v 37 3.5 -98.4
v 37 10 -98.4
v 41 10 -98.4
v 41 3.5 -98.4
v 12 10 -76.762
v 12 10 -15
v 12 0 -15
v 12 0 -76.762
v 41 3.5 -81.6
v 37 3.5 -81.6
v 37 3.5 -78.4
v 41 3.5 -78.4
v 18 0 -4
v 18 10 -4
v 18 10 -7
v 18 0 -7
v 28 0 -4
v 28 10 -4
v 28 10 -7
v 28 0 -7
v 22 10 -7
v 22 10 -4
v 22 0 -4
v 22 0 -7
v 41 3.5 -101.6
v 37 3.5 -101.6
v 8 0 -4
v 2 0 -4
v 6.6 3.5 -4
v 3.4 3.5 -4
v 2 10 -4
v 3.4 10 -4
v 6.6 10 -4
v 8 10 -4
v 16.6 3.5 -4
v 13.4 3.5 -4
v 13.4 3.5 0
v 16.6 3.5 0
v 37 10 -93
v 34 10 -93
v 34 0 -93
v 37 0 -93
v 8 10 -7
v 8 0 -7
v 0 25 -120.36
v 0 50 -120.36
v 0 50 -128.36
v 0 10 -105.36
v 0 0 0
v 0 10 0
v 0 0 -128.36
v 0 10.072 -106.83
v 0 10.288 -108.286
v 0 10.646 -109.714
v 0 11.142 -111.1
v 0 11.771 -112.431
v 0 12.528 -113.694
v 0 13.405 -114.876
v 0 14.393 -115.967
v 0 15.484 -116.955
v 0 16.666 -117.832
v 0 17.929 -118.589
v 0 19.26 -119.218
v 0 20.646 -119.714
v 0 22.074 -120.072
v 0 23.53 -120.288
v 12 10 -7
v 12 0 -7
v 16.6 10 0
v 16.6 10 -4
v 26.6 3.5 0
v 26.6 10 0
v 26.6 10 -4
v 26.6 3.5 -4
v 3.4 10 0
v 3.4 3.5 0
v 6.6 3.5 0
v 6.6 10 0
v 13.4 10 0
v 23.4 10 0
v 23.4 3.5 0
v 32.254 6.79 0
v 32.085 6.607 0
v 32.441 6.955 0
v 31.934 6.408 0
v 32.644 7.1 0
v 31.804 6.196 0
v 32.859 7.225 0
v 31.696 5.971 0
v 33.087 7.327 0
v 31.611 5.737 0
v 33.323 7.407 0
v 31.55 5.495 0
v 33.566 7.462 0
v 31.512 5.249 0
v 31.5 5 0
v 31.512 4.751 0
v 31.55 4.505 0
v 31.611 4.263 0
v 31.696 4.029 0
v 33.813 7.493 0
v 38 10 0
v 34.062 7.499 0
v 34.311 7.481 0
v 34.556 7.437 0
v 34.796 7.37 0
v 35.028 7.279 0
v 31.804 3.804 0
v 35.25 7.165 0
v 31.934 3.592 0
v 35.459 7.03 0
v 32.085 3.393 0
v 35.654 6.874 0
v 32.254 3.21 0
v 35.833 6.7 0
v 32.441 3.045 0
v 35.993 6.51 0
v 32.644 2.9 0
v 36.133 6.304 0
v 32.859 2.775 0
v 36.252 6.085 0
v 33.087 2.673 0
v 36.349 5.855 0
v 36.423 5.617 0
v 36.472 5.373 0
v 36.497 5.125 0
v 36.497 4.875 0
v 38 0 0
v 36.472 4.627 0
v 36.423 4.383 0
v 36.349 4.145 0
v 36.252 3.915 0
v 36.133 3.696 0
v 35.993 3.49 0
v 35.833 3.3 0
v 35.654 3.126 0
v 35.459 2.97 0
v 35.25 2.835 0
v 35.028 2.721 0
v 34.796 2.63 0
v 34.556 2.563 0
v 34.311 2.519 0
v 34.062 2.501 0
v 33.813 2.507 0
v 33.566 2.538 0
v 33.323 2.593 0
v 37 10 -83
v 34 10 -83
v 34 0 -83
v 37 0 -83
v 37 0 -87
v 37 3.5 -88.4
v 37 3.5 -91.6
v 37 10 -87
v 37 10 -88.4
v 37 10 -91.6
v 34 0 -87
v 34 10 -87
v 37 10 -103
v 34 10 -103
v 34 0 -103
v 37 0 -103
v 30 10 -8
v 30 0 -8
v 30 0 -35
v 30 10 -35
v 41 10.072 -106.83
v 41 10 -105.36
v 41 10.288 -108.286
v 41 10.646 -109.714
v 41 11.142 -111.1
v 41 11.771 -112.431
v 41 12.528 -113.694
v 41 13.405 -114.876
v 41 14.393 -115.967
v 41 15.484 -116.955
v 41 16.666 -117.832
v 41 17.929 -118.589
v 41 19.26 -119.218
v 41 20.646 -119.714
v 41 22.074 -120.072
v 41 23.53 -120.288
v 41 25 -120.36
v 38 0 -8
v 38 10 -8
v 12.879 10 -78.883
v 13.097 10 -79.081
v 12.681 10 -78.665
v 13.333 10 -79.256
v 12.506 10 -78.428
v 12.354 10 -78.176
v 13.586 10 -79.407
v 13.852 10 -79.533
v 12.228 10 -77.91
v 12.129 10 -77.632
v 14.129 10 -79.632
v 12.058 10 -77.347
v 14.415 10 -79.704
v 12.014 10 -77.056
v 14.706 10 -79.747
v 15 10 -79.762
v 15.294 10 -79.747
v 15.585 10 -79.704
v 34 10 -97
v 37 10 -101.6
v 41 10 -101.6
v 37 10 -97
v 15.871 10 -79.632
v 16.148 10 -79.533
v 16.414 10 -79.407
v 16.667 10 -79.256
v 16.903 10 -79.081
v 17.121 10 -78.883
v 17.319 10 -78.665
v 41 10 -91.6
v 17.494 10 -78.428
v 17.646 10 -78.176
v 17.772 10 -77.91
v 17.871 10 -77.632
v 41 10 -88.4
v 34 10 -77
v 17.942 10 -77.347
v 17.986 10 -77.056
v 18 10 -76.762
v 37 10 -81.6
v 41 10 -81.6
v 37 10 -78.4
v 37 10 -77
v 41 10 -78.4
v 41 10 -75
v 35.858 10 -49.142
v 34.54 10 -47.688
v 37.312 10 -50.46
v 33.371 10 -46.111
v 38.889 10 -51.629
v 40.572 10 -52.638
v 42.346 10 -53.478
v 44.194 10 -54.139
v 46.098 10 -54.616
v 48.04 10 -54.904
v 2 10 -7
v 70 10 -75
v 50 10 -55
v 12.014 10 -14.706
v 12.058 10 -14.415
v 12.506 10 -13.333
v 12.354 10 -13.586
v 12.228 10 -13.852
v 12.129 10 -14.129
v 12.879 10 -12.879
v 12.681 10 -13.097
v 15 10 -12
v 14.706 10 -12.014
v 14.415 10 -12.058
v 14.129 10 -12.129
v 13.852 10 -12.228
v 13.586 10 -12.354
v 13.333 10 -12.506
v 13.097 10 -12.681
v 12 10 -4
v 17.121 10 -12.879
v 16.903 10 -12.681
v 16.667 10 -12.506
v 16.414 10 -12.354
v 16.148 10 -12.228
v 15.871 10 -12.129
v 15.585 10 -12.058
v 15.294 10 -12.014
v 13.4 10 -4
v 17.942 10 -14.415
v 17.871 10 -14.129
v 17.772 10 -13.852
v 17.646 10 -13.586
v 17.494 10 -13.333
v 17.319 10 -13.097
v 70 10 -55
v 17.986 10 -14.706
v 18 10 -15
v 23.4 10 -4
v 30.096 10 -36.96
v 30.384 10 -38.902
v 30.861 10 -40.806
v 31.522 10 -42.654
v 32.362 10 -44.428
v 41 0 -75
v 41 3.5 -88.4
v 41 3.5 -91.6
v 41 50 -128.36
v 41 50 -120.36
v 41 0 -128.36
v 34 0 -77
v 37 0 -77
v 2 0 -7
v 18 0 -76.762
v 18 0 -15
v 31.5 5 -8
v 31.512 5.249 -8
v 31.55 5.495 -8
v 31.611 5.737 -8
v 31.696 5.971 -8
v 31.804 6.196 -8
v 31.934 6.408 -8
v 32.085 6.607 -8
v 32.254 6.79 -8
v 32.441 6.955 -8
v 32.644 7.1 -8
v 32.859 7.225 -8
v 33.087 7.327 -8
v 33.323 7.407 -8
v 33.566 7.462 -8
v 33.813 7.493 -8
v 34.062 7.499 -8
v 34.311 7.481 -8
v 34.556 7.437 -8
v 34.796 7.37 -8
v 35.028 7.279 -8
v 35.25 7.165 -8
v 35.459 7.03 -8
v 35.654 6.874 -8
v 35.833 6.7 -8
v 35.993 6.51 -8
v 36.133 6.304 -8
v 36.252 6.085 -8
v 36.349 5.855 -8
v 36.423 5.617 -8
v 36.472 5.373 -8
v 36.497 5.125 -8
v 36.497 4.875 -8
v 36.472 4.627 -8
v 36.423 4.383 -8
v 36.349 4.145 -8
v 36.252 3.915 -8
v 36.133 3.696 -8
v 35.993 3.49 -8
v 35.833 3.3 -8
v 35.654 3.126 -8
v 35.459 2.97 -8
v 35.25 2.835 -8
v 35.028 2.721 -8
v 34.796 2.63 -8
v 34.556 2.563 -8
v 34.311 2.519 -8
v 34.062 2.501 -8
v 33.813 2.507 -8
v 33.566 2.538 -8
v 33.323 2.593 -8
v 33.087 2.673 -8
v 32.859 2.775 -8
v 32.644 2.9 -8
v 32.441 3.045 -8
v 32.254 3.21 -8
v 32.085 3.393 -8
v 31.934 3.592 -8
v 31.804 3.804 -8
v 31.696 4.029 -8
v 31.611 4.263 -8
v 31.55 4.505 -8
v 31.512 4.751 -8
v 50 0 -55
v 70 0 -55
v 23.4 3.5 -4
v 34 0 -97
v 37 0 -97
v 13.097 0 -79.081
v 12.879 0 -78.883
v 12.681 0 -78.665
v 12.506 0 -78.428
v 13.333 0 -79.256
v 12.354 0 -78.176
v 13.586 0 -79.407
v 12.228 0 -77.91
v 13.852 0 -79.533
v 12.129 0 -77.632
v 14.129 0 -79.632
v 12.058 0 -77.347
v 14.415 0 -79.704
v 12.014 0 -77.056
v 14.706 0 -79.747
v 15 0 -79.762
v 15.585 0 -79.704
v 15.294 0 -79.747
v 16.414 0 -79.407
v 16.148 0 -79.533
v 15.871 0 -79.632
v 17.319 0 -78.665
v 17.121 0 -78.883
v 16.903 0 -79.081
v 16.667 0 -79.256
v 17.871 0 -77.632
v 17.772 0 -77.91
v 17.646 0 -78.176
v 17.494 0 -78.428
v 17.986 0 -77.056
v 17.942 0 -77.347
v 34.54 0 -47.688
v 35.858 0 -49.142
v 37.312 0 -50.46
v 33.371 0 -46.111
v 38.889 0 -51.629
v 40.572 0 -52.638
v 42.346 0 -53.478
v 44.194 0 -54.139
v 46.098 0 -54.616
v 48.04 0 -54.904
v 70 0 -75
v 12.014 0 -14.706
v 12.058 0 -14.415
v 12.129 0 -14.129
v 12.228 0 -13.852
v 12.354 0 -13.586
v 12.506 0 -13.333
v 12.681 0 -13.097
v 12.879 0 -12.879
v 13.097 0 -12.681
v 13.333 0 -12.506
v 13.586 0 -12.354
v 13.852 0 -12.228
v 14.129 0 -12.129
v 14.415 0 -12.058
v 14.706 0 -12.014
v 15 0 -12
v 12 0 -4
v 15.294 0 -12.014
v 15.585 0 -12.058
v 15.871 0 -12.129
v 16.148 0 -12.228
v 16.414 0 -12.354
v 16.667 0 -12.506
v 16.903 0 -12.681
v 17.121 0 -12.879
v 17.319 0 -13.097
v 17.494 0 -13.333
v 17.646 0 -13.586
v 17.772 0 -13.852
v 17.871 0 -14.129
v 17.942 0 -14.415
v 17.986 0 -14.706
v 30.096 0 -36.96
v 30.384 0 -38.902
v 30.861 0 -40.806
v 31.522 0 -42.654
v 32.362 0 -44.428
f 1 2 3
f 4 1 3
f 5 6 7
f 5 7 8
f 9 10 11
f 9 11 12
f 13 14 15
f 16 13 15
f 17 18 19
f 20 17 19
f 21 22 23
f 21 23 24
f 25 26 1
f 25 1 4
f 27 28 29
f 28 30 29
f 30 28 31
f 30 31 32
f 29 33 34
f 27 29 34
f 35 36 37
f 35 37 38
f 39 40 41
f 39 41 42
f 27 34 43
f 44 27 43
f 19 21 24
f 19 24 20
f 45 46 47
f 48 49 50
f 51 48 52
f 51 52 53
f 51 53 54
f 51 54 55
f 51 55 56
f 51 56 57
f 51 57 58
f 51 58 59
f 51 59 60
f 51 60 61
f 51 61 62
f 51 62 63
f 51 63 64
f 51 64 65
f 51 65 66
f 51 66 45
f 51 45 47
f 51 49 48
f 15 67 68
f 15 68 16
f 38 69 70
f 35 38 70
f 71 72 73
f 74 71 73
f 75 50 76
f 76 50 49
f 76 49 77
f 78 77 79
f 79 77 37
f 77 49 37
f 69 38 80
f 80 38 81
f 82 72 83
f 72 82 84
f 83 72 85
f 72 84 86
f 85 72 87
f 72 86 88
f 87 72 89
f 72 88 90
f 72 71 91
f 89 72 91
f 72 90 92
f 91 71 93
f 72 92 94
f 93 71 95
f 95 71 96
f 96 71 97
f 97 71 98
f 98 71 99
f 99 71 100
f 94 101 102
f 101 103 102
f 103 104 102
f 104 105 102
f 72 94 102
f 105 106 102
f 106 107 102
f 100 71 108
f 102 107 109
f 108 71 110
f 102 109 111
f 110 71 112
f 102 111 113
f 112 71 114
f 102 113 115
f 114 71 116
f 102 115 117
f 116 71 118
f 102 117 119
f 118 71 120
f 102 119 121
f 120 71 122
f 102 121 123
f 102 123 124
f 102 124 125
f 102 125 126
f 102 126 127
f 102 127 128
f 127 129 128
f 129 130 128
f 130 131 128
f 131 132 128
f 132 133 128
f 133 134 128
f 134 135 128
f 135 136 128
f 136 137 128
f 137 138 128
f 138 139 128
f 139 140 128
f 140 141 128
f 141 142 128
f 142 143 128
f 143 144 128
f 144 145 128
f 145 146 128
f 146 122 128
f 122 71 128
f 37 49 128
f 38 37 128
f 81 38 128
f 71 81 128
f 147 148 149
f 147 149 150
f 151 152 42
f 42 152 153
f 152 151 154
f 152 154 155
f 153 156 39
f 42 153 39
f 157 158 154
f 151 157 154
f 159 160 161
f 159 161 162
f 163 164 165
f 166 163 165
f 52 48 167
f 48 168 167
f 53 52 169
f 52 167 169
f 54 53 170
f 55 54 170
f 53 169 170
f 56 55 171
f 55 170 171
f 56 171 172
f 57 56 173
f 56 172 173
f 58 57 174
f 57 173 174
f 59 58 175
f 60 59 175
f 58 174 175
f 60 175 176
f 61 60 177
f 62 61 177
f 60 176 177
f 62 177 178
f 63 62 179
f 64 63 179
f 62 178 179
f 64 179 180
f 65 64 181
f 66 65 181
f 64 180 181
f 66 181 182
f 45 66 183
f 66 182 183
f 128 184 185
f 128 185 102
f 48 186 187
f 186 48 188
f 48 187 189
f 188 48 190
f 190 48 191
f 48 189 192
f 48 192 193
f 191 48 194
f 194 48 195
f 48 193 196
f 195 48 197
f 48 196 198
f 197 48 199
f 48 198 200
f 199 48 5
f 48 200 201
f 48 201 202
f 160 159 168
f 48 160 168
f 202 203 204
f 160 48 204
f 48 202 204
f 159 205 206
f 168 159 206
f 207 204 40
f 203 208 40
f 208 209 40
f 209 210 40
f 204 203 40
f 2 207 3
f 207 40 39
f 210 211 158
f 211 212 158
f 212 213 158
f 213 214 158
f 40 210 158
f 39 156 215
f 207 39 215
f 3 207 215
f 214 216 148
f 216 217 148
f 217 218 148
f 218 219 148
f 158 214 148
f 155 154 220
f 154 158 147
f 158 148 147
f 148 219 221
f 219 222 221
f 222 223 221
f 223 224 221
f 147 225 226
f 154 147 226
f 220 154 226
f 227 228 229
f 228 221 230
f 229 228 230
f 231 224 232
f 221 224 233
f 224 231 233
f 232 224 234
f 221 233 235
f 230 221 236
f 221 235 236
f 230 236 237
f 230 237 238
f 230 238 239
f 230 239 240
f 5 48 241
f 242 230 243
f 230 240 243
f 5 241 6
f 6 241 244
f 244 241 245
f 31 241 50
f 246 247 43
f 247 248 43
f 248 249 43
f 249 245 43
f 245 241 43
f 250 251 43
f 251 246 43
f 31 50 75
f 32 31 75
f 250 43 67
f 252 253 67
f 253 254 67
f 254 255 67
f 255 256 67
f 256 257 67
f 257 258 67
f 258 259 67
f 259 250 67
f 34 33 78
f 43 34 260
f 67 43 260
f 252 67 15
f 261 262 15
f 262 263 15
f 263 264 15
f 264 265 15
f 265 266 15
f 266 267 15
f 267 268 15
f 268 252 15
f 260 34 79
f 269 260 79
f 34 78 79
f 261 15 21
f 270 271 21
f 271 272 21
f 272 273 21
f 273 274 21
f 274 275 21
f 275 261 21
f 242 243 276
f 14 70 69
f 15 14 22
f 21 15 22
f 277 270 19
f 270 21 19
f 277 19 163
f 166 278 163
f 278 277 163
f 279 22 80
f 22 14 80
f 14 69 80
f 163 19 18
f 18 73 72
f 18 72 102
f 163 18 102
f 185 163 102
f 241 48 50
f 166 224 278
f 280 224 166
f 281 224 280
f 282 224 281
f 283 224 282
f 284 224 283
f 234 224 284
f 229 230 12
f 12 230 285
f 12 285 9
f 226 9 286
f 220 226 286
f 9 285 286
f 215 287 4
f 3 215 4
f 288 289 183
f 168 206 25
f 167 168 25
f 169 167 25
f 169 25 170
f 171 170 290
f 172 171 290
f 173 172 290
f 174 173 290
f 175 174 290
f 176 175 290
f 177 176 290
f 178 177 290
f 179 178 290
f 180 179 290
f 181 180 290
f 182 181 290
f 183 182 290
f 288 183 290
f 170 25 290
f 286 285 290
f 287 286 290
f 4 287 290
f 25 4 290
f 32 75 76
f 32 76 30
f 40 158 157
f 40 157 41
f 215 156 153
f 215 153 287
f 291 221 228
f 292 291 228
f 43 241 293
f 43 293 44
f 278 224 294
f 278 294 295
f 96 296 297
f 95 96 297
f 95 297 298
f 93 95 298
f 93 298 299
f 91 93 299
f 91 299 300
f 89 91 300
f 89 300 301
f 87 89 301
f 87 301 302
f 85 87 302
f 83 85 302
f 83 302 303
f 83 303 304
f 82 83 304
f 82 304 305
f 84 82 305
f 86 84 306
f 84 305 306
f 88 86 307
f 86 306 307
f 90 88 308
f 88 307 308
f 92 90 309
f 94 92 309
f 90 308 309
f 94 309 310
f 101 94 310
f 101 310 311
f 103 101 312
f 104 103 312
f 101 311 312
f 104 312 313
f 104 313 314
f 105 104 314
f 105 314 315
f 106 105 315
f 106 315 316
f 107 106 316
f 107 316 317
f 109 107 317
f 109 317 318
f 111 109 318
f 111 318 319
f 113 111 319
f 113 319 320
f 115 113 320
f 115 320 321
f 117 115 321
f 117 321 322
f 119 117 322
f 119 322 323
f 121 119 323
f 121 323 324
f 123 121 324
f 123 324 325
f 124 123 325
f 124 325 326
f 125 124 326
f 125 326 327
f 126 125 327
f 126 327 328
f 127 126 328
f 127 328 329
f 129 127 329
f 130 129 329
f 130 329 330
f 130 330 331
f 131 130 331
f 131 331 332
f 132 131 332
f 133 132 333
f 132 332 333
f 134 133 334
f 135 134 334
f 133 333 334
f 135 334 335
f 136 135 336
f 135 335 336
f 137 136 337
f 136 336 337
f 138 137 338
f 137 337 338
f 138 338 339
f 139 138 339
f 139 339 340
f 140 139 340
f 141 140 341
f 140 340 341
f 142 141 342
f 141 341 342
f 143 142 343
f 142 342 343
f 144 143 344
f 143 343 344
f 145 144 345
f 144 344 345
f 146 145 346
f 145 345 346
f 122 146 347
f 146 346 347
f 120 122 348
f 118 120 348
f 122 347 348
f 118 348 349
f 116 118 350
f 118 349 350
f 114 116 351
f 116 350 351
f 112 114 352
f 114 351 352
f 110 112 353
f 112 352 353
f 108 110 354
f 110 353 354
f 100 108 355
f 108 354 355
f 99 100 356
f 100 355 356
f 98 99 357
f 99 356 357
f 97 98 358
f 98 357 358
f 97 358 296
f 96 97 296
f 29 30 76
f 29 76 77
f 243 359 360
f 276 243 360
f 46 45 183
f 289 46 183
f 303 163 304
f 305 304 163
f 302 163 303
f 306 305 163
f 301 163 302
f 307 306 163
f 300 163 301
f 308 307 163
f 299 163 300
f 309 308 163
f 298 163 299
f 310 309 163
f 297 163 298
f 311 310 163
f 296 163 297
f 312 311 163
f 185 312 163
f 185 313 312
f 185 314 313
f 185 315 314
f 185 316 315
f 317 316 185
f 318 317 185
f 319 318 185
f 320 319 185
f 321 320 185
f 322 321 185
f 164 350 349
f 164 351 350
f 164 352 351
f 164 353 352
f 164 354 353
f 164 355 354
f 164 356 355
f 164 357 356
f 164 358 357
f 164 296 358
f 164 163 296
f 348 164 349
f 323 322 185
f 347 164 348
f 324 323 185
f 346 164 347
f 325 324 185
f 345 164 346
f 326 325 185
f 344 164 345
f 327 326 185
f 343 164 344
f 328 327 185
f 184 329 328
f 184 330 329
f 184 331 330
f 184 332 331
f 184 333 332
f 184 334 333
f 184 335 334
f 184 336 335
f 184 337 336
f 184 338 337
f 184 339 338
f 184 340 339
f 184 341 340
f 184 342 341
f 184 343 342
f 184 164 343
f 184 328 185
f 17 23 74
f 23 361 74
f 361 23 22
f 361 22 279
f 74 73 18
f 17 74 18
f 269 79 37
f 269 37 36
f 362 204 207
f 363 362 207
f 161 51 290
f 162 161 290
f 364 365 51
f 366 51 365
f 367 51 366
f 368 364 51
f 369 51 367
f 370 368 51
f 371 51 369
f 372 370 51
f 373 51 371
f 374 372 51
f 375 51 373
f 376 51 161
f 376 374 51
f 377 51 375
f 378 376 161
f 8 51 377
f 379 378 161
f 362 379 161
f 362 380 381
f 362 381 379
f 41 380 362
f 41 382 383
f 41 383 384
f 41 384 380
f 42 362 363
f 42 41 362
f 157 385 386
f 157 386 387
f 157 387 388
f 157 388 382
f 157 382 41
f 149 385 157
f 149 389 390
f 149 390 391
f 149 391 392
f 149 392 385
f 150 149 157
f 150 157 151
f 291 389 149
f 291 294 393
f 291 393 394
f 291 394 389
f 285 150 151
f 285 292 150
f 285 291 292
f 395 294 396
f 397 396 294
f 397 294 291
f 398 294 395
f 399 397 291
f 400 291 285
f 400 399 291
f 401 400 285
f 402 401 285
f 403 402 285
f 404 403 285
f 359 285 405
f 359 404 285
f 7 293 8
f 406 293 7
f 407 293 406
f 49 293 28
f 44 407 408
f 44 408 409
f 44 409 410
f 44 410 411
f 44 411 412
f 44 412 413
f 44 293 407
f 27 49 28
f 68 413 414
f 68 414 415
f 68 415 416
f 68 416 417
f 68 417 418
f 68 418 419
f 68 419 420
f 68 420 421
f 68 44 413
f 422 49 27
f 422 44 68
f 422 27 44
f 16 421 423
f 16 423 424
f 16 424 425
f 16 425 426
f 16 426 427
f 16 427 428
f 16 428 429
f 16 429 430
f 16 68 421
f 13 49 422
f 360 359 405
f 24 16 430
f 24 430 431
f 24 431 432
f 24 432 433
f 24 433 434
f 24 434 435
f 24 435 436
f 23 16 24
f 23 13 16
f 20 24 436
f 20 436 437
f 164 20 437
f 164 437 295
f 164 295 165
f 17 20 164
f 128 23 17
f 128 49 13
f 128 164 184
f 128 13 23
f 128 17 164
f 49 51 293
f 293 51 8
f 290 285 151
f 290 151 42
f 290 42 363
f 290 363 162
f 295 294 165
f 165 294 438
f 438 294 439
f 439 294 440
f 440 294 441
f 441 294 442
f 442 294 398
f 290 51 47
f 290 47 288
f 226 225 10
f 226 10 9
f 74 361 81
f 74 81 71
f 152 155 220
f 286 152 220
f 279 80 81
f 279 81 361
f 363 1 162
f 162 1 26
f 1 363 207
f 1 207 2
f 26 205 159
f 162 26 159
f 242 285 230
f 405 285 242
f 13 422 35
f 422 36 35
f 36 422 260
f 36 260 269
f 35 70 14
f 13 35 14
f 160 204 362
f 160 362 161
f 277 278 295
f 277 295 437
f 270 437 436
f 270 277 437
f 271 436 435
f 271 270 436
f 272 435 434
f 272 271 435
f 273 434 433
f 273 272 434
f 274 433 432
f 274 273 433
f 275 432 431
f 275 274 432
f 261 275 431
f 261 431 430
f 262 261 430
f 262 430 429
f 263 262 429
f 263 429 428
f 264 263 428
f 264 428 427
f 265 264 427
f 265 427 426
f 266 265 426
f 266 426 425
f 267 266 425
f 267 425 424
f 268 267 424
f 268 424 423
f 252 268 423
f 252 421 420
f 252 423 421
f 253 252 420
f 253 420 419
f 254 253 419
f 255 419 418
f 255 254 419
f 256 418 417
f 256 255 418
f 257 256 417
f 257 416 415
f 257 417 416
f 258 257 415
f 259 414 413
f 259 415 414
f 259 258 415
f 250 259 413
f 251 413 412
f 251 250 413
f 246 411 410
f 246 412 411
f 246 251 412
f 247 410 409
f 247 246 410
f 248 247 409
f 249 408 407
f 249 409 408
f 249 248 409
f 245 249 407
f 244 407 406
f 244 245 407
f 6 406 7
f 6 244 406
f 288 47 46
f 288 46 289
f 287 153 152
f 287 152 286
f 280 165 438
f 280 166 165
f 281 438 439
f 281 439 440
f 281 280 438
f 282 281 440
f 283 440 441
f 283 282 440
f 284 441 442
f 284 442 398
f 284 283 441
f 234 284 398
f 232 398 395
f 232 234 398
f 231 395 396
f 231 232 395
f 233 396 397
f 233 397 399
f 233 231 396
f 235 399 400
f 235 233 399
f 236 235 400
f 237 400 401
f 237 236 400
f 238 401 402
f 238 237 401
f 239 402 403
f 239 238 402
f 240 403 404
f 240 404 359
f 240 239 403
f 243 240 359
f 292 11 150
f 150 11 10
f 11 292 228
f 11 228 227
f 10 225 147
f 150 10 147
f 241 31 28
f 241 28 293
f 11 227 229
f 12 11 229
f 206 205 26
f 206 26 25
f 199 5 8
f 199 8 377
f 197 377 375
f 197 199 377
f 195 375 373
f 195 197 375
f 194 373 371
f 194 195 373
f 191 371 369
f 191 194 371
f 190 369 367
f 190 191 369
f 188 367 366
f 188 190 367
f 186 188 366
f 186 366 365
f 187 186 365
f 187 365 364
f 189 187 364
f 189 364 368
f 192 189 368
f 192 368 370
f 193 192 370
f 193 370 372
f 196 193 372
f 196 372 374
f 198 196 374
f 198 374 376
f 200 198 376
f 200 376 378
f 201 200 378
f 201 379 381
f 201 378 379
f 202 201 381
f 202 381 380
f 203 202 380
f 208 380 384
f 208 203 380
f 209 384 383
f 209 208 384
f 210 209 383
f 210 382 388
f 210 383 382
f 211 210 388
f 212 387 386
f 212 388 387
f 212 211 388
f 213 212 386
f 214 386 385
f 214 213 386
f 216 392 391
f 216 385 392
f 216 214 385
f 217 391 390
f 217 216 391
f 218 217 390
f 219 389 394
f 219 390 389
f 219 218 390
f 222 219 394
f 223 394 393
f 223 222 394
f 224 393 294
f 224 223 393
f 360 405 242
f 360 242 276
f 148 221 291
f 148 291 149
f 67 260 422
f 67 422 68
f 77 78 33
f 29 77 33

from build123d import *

# Parameters (mm, degrees)
EXTRUDE_1_DEPTH     = 10
CUT_EXTRUDE_3_DEPTH = 16
SKETCH_6_W          = 4
SKETCH_6_H          = 3.2
SKETCH_6_W_2        = 3.2
SKETCH_6_H_2        = 4
CUT_EXTRUDE_5_DEPTH = 6.5
SKETCH_7_W          = 6
SKETCH_7_H          = 3
SKETCH_7_W_2        = 3
SKETCH_7_H_2        = 6
CUT_EXTRUDE_6_DEPTH = 16.5
SKETCH_8_W          = 40
SKETCH_8_H          = 20
EXTRUDE_2_DEPTH     = 10
SKETCH_9_W          = 41
SKETCH_9_H          = 10
EXTRUDE_3_DEPTH     = 23.36
SKETCH_10_W         = 41
SKETCH_10_H         = 8
EXTRUDE_4_DEPTH     = 40
SKETCH_11_W         = 8
SKETCH_11_H         = 8
EXTRUDE_5_DEPTH     = 10
SKETCH_12_R         = 2.5
CUT_EXTRUDE_7_DEPTH = 10
FILLET_1_R          = 20
FILLET_2_R          = 15


with BuildPart() as part:
    # 草图1 → 凸台-拉伸1 (new body)
    with BuildSketch(Plane(origin=(0, 0, 0), x_dir=(1, 0, 0), z_dir=(0, 1, 0))):
        Polygon((0, 105), (0, 75), (0, 0), (30, 0), (30, 75), (41, 75), (41, 105), (30, 105), align=None)
    extrude(amount=EXTRUDE_1_DEPTH)

    # 草图4 → 切除-拉伸3 (cut)
    with BuildSketch(Plane(origin=(0, 10, 0), x_dir=(1, 0, 0), z_dir=(0, 1, 0))):
        with BuildLine():
            Line((12, 15), (12, 76.76156826))
            ThreePointArc((12, 76.76156826), (15, 79.76156826), (18, 76.76156826))
            Line((18, 76.76156826), (18, 15))
            ThreePointArc((18, 15), (15, 12), (12, 15))
        make_face()
    extrude(amount=-CUT_EXTRUDE_3_DEPTH, mode=Mode.SUBTRACT)

    # 草图6 → 切除-拉伸5 (cut)
    with BuildSketch(Plane(origin=(0, 10, 0), x_dir=(1, 0, 0), z_dir=(0, 1, 0))):
        with Locations((39, 100)):
            Rectangle(SKETCH_6_W, SKETCH_6_H)
        with Locations((5, 2)):
            Rectangle(SKETCH_6_W_2, SKETCH_6_H_2)
        with Locations((39, 90)):
            Rectangle(SKETCH_6_W, SKETCH_6_H)
        with Locations((39, 80)):
            Rectangle(SKETCH_6_W, SKETCH_6_H)
        with Locations((15, 2)):
            Rectangle(SKETCH_6_W_2, SKETCH_6_H_2)
        with Locations((25, 2)):
            Rectangle(SKETCH_6_W_2, SKETCH_6_H_2)
    extrude(amount=-CUT_EXTRUDE_5_DEPTH, mode=Mode.SUBTRACT)

    # 草图7 → 切除-拉伸6 (cut)
    with BuildSketch(Plane(origin=(0, 10, 0), x_dir=(1, 0, 0), z_dir=(0, 1, 0))):
        with Locations((5, 5.5)):
            Rectangle(SKETCH_7_W, SKETCH_7_H)
        with Locations((15, 5.5)):
            Rectangle(SKETCH_7_W, SKETCH_7_H)
        with Locations((25, 5.5)):
            Rectangle(SKETCH_7_W, SKETCH_7_H)
        with Locations((35.5, 100)):
            Rectangle(SKETCH_7_W_2, SKETCH_7_H_2)
        with Locations((35.5, 90)):
            Rectangle(SKETCH_7_W_2, SKETCH_7_H_2)
        with Locations((35.5, 80)):
            Rectangle(SKETCH_7_W_2, SKETCH_7_H_2)
    extrude(amount=-CUT_EXTRUDE_6_DEPTH, mode=Mode.SUBTRACT)

    # 草图8 → 凸台-拉伸2 (add)
    with BuildSketch(Plane.XZ):
        with Locations((50, -65)):
            Rectangle(SKETCH_8_W, SKETCH_8_H)
    extrude(amount=-EXTRUDE_2_DEPTH)

    # 草图9 → 凸台-拉伸3 (add)
    with BuildSketch(Plane(origin=(0, 0, -105), x_dir=(-1, 0, 0), z_dir=(0, 0, -1))):
        with Locations((-20.5, 5)):
            Rectangle(SKETCH_9_W, SKETCH_9_H)
    extrude(amount=EXTRUDE_3_DEPTH)

    # 草图10 → 凸台-拉伸4 (add)
    with BuildSketch(Plane(origin=(0, 10, 0), x_dir=(1, 0, 0), z_dir=(0, 1, 0))):
        with Locations((20.5, 124.36)):
            Rectangle(SKETCH_10_W, SKETCH_10_H)
    extrude(amount=EXTRUDE_4_DEPTH)

    # 草图11 → 凸台-拉伸5 (add)
    with BuildSketch(Plane.XZ):
        with Locations((34, -4)):
            Rectangle(SKETCH_11_W, SKETCH_11_H)
    extrude(amount=-EXTRUDE_5_DEPTH)

    # 草图12 → 切除-拉伸7 (cut)
    with BuildSketch(Plane(origin=(0, 0, -8), x_dir=(-1, 0, 0), z_dir=(0, 0, -1))):
        with Locations((-34, 5)):
            Circle(SKETCH_12_R)
    extrude(amount=-CUT_EXTRUDE_7_DEPTH, mode=Mode.SUBTRACT)

    # 圆角1
    fillet_1_edges = [part.edges().sort_by_distance(p)[0] for p in [
        (30, 5, -55),
    ]]
    fillet(fillet_1_edges, radius=FILLET_1_R)

    # 圆角2
    fillet_2_edges = [part.edges().sort_by_distance(p)[0] for p in [
        (20.5, 10, -120.36),
    ]]
    fillet(fillet_2_edges, radius=FILLET_2_R)


solid = part.part
